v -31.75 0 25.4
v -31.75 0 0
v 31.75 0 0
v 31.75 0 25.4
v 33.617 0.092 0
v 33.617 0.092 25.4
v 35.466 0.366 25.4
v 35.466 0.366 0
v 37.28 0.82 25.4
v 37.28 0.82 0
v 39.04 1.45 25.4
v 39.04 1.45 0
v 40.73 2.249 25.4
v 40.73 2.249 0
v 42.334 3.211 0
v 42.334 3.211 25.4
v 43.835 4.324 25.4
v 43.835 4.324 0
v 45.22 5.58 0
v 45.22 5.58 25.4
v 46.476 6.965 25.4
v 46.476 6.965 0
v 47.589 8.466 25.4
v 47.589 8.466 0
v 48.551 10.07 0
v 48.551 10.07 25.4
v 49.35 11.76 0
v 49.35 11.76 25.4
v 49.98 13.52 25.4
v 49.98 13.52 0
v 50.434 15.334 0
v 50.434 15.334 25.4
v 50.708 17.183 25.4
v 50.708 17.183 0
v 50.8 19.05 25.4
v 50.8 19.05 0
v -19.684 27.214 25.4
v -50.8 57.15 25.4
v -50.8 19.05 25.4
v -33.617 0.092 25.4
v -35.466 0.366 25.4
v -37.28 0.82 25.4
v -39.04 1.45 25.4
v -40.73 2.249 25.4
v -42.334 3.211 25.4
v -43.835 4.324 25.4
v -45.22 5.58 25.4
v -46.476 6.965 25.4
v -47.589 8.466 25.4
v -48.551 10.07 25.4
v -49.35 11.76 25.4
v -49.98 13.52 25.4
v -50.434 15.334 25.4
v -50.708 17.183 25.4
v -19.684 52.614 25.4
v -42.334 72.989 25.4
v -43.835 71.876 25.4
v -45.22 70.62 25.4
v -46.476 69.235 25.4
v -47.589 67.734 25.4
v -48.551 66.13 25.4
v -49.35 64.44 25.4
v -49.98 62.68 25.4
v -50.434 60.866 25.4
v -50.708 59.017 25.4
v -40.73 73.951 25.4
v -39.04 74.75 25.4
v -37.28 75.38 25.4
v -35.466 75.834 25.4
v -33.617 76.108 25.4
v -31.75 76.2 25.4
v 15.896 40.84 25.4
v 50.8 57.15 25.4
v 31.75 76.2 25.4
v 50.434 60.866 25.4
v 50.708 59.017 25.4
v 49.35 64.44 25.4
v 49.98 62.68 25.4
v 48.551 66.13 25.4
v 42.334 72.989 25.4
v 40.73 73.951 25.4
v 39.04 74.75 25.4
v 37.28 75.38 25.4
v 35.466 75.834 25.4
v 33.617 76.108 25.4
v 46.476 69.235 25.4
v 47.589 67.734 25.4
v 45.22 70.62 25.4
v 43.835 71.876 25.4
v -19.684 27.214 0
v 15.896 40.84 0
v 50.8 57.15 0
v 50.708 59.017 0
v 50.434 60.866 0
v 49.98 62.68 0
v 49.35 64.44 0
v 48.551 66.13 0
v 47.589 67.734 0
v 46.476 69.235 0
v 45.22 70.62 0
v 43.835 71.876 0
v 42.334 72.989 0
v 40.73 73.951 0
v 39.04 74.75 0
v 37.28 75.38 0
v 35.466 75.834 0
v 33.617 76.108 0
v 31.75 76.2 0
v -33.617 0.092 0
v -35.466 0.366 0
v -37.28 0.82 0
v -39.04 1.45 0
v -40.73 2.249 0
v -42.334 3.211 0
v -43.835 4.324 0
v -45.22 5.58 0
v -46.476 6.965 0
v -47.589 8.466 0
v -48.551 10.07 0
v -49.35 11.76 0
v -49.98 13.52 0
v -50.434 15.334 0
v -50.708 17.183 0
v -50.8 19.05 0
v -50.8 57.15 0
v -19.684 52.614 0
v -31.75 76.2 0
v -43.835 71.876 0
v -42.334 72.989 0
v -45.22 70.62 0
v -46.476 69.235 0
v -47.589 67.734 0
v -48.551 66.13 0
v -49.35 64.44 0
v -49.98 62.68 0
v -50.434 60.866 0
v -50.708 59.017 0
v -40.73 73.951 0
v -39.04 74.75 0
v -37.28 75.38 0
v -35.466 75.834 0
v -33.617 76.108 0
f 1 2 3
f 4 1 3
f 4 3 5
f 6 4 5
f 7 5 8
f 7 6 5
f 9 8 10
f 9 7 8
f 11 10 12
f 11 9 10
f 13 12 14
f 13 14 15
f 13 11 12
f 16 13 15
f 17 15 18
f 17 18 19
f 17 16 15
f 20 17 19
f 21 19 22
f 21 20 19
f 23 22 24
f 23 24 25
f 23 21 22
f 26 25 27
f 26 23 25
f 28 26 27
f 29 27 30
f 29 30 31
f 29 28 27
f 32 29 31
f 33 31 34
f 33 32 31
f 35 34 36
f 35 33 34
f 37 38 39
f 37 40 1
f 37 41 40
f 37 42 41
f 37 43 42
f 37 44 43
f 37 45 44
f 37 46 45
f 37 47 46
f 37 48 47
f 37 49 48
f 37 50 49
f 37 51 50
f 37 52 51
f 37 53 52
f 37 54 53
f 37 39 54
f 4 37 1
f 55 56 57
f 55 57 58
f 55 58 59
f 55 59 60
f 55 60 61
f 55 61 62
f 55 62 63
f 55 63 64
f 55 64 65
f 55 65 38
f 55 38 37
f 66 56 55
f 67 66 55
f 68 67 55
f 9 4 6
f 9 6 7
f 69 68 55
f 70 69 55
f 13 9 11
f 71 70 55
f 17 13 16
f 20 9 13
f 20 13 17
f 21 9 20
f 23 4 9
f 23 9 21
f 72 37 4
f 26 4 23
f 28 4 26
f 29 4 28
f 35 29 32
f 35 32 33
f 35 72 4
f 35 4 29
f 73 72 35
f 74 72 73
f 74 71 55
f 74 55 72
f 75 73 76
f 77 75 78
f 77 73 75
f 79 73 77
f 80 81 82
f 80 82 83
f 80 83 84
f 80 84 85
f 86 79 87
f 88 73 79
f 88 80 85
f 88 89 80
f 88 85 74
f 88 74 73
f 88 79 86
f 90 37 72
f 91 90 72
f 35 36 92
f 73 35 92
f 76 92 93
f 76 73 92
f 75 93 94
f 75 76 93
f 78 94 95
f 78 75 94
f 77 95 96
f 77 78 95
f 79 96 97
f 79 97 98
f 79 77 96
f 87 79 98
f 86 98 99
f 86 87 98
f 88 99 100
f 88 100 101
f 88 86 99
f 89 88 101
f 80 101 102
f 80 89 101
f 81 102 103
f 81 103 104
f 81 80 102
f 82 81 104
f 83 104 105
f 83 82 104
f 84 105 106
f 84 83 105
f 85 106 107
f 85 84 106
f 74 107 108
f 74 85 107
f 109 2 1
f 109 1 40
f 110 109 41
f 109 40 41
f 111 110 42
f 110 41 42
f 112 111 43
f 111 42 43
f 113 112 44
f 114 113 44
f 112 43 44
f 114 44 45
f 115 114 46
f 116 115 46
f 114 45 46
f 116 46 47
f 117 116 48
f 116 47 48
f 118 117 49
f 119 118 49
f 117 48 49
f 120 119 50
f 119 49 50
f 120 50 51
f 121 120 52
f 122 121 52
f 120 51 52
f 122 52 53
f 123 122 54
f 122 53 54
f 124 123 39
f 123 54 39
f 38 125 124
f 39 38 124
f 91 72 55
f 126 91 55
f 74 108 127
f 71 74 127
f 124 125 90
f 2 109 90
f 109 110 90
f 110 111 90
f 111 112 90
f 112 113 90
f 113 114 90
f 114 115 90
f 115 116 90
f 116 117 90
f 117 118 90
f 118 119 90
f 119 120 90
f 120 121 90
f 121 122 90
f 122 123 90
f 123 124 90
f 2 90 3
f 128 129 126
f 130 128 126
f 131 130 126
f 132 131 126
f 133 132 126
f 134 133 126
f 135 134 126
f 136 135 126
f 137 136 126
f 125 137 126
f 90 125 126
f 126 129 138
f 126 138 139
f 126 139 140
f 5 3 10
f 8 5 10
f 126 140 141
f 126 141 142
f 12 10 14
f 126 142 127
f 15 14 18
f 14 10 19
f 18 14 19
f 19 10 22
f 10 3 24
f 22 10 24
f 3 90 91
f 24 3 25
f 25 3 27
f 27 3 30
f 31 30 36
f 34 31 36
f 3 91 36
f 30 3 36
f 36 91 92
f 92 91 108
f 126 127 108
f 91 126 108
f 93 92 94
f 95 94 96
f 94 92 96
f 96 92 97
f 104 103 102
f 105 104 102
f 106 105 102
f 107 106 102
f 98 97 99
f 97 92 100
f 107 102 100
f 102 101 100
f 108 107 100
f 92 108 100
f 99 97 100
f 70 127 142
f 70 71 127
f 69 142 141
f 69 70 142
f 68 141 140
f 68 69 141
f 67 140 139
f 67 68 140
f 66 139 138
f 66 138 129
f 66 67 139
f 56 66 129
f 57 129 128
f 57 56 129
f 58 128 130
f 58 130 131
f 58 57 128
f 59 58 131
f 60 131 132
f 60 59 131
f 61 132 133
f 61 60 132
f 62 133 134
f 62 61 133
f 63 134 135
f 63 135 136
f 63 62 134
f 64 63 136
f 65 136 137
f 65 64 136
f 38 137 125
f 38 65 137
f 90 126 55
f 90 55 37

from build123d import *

# Parameters (mm, degrees)
F1_DEPTH = 25.4
F2_R     = 19.05
F4_DEPTH = 254


with BuildPart() as f1:
    # F0 (on Top) → F1 (new body)
    with BuildSketch(Plane.XY):
        Polygon((-50.8, 0), (0, 0), (50.8, 0), (50.8, 76.2), (-50.8, 76.2), align=None)
    extrude(amount=F1_DEPTH)

    # F2
    f2_edges = [f1.edges().sort_by_distance(p)[0] for p in [
        (-50.8, 0, 12.7),
        (50.8, 0, 12.7),
        (-50.8, 76.2, 12.7),
        (50.8, 76.2, 12.7),
    ]]
    fillet(f2_edges, radius=F2_R)

    # F3 (on face) → F4 (cut)
    with BuildSketch(Plane.XY.offset(25.4)):
        Polygon((-19.6837, 52.613977), (-19.6837, 27.213977), (15.896244, 40.840335), align=None)
    extrude(amount=-F4_DEPTH, mode=Mode.SUBTRACT)


solid = f1.part
